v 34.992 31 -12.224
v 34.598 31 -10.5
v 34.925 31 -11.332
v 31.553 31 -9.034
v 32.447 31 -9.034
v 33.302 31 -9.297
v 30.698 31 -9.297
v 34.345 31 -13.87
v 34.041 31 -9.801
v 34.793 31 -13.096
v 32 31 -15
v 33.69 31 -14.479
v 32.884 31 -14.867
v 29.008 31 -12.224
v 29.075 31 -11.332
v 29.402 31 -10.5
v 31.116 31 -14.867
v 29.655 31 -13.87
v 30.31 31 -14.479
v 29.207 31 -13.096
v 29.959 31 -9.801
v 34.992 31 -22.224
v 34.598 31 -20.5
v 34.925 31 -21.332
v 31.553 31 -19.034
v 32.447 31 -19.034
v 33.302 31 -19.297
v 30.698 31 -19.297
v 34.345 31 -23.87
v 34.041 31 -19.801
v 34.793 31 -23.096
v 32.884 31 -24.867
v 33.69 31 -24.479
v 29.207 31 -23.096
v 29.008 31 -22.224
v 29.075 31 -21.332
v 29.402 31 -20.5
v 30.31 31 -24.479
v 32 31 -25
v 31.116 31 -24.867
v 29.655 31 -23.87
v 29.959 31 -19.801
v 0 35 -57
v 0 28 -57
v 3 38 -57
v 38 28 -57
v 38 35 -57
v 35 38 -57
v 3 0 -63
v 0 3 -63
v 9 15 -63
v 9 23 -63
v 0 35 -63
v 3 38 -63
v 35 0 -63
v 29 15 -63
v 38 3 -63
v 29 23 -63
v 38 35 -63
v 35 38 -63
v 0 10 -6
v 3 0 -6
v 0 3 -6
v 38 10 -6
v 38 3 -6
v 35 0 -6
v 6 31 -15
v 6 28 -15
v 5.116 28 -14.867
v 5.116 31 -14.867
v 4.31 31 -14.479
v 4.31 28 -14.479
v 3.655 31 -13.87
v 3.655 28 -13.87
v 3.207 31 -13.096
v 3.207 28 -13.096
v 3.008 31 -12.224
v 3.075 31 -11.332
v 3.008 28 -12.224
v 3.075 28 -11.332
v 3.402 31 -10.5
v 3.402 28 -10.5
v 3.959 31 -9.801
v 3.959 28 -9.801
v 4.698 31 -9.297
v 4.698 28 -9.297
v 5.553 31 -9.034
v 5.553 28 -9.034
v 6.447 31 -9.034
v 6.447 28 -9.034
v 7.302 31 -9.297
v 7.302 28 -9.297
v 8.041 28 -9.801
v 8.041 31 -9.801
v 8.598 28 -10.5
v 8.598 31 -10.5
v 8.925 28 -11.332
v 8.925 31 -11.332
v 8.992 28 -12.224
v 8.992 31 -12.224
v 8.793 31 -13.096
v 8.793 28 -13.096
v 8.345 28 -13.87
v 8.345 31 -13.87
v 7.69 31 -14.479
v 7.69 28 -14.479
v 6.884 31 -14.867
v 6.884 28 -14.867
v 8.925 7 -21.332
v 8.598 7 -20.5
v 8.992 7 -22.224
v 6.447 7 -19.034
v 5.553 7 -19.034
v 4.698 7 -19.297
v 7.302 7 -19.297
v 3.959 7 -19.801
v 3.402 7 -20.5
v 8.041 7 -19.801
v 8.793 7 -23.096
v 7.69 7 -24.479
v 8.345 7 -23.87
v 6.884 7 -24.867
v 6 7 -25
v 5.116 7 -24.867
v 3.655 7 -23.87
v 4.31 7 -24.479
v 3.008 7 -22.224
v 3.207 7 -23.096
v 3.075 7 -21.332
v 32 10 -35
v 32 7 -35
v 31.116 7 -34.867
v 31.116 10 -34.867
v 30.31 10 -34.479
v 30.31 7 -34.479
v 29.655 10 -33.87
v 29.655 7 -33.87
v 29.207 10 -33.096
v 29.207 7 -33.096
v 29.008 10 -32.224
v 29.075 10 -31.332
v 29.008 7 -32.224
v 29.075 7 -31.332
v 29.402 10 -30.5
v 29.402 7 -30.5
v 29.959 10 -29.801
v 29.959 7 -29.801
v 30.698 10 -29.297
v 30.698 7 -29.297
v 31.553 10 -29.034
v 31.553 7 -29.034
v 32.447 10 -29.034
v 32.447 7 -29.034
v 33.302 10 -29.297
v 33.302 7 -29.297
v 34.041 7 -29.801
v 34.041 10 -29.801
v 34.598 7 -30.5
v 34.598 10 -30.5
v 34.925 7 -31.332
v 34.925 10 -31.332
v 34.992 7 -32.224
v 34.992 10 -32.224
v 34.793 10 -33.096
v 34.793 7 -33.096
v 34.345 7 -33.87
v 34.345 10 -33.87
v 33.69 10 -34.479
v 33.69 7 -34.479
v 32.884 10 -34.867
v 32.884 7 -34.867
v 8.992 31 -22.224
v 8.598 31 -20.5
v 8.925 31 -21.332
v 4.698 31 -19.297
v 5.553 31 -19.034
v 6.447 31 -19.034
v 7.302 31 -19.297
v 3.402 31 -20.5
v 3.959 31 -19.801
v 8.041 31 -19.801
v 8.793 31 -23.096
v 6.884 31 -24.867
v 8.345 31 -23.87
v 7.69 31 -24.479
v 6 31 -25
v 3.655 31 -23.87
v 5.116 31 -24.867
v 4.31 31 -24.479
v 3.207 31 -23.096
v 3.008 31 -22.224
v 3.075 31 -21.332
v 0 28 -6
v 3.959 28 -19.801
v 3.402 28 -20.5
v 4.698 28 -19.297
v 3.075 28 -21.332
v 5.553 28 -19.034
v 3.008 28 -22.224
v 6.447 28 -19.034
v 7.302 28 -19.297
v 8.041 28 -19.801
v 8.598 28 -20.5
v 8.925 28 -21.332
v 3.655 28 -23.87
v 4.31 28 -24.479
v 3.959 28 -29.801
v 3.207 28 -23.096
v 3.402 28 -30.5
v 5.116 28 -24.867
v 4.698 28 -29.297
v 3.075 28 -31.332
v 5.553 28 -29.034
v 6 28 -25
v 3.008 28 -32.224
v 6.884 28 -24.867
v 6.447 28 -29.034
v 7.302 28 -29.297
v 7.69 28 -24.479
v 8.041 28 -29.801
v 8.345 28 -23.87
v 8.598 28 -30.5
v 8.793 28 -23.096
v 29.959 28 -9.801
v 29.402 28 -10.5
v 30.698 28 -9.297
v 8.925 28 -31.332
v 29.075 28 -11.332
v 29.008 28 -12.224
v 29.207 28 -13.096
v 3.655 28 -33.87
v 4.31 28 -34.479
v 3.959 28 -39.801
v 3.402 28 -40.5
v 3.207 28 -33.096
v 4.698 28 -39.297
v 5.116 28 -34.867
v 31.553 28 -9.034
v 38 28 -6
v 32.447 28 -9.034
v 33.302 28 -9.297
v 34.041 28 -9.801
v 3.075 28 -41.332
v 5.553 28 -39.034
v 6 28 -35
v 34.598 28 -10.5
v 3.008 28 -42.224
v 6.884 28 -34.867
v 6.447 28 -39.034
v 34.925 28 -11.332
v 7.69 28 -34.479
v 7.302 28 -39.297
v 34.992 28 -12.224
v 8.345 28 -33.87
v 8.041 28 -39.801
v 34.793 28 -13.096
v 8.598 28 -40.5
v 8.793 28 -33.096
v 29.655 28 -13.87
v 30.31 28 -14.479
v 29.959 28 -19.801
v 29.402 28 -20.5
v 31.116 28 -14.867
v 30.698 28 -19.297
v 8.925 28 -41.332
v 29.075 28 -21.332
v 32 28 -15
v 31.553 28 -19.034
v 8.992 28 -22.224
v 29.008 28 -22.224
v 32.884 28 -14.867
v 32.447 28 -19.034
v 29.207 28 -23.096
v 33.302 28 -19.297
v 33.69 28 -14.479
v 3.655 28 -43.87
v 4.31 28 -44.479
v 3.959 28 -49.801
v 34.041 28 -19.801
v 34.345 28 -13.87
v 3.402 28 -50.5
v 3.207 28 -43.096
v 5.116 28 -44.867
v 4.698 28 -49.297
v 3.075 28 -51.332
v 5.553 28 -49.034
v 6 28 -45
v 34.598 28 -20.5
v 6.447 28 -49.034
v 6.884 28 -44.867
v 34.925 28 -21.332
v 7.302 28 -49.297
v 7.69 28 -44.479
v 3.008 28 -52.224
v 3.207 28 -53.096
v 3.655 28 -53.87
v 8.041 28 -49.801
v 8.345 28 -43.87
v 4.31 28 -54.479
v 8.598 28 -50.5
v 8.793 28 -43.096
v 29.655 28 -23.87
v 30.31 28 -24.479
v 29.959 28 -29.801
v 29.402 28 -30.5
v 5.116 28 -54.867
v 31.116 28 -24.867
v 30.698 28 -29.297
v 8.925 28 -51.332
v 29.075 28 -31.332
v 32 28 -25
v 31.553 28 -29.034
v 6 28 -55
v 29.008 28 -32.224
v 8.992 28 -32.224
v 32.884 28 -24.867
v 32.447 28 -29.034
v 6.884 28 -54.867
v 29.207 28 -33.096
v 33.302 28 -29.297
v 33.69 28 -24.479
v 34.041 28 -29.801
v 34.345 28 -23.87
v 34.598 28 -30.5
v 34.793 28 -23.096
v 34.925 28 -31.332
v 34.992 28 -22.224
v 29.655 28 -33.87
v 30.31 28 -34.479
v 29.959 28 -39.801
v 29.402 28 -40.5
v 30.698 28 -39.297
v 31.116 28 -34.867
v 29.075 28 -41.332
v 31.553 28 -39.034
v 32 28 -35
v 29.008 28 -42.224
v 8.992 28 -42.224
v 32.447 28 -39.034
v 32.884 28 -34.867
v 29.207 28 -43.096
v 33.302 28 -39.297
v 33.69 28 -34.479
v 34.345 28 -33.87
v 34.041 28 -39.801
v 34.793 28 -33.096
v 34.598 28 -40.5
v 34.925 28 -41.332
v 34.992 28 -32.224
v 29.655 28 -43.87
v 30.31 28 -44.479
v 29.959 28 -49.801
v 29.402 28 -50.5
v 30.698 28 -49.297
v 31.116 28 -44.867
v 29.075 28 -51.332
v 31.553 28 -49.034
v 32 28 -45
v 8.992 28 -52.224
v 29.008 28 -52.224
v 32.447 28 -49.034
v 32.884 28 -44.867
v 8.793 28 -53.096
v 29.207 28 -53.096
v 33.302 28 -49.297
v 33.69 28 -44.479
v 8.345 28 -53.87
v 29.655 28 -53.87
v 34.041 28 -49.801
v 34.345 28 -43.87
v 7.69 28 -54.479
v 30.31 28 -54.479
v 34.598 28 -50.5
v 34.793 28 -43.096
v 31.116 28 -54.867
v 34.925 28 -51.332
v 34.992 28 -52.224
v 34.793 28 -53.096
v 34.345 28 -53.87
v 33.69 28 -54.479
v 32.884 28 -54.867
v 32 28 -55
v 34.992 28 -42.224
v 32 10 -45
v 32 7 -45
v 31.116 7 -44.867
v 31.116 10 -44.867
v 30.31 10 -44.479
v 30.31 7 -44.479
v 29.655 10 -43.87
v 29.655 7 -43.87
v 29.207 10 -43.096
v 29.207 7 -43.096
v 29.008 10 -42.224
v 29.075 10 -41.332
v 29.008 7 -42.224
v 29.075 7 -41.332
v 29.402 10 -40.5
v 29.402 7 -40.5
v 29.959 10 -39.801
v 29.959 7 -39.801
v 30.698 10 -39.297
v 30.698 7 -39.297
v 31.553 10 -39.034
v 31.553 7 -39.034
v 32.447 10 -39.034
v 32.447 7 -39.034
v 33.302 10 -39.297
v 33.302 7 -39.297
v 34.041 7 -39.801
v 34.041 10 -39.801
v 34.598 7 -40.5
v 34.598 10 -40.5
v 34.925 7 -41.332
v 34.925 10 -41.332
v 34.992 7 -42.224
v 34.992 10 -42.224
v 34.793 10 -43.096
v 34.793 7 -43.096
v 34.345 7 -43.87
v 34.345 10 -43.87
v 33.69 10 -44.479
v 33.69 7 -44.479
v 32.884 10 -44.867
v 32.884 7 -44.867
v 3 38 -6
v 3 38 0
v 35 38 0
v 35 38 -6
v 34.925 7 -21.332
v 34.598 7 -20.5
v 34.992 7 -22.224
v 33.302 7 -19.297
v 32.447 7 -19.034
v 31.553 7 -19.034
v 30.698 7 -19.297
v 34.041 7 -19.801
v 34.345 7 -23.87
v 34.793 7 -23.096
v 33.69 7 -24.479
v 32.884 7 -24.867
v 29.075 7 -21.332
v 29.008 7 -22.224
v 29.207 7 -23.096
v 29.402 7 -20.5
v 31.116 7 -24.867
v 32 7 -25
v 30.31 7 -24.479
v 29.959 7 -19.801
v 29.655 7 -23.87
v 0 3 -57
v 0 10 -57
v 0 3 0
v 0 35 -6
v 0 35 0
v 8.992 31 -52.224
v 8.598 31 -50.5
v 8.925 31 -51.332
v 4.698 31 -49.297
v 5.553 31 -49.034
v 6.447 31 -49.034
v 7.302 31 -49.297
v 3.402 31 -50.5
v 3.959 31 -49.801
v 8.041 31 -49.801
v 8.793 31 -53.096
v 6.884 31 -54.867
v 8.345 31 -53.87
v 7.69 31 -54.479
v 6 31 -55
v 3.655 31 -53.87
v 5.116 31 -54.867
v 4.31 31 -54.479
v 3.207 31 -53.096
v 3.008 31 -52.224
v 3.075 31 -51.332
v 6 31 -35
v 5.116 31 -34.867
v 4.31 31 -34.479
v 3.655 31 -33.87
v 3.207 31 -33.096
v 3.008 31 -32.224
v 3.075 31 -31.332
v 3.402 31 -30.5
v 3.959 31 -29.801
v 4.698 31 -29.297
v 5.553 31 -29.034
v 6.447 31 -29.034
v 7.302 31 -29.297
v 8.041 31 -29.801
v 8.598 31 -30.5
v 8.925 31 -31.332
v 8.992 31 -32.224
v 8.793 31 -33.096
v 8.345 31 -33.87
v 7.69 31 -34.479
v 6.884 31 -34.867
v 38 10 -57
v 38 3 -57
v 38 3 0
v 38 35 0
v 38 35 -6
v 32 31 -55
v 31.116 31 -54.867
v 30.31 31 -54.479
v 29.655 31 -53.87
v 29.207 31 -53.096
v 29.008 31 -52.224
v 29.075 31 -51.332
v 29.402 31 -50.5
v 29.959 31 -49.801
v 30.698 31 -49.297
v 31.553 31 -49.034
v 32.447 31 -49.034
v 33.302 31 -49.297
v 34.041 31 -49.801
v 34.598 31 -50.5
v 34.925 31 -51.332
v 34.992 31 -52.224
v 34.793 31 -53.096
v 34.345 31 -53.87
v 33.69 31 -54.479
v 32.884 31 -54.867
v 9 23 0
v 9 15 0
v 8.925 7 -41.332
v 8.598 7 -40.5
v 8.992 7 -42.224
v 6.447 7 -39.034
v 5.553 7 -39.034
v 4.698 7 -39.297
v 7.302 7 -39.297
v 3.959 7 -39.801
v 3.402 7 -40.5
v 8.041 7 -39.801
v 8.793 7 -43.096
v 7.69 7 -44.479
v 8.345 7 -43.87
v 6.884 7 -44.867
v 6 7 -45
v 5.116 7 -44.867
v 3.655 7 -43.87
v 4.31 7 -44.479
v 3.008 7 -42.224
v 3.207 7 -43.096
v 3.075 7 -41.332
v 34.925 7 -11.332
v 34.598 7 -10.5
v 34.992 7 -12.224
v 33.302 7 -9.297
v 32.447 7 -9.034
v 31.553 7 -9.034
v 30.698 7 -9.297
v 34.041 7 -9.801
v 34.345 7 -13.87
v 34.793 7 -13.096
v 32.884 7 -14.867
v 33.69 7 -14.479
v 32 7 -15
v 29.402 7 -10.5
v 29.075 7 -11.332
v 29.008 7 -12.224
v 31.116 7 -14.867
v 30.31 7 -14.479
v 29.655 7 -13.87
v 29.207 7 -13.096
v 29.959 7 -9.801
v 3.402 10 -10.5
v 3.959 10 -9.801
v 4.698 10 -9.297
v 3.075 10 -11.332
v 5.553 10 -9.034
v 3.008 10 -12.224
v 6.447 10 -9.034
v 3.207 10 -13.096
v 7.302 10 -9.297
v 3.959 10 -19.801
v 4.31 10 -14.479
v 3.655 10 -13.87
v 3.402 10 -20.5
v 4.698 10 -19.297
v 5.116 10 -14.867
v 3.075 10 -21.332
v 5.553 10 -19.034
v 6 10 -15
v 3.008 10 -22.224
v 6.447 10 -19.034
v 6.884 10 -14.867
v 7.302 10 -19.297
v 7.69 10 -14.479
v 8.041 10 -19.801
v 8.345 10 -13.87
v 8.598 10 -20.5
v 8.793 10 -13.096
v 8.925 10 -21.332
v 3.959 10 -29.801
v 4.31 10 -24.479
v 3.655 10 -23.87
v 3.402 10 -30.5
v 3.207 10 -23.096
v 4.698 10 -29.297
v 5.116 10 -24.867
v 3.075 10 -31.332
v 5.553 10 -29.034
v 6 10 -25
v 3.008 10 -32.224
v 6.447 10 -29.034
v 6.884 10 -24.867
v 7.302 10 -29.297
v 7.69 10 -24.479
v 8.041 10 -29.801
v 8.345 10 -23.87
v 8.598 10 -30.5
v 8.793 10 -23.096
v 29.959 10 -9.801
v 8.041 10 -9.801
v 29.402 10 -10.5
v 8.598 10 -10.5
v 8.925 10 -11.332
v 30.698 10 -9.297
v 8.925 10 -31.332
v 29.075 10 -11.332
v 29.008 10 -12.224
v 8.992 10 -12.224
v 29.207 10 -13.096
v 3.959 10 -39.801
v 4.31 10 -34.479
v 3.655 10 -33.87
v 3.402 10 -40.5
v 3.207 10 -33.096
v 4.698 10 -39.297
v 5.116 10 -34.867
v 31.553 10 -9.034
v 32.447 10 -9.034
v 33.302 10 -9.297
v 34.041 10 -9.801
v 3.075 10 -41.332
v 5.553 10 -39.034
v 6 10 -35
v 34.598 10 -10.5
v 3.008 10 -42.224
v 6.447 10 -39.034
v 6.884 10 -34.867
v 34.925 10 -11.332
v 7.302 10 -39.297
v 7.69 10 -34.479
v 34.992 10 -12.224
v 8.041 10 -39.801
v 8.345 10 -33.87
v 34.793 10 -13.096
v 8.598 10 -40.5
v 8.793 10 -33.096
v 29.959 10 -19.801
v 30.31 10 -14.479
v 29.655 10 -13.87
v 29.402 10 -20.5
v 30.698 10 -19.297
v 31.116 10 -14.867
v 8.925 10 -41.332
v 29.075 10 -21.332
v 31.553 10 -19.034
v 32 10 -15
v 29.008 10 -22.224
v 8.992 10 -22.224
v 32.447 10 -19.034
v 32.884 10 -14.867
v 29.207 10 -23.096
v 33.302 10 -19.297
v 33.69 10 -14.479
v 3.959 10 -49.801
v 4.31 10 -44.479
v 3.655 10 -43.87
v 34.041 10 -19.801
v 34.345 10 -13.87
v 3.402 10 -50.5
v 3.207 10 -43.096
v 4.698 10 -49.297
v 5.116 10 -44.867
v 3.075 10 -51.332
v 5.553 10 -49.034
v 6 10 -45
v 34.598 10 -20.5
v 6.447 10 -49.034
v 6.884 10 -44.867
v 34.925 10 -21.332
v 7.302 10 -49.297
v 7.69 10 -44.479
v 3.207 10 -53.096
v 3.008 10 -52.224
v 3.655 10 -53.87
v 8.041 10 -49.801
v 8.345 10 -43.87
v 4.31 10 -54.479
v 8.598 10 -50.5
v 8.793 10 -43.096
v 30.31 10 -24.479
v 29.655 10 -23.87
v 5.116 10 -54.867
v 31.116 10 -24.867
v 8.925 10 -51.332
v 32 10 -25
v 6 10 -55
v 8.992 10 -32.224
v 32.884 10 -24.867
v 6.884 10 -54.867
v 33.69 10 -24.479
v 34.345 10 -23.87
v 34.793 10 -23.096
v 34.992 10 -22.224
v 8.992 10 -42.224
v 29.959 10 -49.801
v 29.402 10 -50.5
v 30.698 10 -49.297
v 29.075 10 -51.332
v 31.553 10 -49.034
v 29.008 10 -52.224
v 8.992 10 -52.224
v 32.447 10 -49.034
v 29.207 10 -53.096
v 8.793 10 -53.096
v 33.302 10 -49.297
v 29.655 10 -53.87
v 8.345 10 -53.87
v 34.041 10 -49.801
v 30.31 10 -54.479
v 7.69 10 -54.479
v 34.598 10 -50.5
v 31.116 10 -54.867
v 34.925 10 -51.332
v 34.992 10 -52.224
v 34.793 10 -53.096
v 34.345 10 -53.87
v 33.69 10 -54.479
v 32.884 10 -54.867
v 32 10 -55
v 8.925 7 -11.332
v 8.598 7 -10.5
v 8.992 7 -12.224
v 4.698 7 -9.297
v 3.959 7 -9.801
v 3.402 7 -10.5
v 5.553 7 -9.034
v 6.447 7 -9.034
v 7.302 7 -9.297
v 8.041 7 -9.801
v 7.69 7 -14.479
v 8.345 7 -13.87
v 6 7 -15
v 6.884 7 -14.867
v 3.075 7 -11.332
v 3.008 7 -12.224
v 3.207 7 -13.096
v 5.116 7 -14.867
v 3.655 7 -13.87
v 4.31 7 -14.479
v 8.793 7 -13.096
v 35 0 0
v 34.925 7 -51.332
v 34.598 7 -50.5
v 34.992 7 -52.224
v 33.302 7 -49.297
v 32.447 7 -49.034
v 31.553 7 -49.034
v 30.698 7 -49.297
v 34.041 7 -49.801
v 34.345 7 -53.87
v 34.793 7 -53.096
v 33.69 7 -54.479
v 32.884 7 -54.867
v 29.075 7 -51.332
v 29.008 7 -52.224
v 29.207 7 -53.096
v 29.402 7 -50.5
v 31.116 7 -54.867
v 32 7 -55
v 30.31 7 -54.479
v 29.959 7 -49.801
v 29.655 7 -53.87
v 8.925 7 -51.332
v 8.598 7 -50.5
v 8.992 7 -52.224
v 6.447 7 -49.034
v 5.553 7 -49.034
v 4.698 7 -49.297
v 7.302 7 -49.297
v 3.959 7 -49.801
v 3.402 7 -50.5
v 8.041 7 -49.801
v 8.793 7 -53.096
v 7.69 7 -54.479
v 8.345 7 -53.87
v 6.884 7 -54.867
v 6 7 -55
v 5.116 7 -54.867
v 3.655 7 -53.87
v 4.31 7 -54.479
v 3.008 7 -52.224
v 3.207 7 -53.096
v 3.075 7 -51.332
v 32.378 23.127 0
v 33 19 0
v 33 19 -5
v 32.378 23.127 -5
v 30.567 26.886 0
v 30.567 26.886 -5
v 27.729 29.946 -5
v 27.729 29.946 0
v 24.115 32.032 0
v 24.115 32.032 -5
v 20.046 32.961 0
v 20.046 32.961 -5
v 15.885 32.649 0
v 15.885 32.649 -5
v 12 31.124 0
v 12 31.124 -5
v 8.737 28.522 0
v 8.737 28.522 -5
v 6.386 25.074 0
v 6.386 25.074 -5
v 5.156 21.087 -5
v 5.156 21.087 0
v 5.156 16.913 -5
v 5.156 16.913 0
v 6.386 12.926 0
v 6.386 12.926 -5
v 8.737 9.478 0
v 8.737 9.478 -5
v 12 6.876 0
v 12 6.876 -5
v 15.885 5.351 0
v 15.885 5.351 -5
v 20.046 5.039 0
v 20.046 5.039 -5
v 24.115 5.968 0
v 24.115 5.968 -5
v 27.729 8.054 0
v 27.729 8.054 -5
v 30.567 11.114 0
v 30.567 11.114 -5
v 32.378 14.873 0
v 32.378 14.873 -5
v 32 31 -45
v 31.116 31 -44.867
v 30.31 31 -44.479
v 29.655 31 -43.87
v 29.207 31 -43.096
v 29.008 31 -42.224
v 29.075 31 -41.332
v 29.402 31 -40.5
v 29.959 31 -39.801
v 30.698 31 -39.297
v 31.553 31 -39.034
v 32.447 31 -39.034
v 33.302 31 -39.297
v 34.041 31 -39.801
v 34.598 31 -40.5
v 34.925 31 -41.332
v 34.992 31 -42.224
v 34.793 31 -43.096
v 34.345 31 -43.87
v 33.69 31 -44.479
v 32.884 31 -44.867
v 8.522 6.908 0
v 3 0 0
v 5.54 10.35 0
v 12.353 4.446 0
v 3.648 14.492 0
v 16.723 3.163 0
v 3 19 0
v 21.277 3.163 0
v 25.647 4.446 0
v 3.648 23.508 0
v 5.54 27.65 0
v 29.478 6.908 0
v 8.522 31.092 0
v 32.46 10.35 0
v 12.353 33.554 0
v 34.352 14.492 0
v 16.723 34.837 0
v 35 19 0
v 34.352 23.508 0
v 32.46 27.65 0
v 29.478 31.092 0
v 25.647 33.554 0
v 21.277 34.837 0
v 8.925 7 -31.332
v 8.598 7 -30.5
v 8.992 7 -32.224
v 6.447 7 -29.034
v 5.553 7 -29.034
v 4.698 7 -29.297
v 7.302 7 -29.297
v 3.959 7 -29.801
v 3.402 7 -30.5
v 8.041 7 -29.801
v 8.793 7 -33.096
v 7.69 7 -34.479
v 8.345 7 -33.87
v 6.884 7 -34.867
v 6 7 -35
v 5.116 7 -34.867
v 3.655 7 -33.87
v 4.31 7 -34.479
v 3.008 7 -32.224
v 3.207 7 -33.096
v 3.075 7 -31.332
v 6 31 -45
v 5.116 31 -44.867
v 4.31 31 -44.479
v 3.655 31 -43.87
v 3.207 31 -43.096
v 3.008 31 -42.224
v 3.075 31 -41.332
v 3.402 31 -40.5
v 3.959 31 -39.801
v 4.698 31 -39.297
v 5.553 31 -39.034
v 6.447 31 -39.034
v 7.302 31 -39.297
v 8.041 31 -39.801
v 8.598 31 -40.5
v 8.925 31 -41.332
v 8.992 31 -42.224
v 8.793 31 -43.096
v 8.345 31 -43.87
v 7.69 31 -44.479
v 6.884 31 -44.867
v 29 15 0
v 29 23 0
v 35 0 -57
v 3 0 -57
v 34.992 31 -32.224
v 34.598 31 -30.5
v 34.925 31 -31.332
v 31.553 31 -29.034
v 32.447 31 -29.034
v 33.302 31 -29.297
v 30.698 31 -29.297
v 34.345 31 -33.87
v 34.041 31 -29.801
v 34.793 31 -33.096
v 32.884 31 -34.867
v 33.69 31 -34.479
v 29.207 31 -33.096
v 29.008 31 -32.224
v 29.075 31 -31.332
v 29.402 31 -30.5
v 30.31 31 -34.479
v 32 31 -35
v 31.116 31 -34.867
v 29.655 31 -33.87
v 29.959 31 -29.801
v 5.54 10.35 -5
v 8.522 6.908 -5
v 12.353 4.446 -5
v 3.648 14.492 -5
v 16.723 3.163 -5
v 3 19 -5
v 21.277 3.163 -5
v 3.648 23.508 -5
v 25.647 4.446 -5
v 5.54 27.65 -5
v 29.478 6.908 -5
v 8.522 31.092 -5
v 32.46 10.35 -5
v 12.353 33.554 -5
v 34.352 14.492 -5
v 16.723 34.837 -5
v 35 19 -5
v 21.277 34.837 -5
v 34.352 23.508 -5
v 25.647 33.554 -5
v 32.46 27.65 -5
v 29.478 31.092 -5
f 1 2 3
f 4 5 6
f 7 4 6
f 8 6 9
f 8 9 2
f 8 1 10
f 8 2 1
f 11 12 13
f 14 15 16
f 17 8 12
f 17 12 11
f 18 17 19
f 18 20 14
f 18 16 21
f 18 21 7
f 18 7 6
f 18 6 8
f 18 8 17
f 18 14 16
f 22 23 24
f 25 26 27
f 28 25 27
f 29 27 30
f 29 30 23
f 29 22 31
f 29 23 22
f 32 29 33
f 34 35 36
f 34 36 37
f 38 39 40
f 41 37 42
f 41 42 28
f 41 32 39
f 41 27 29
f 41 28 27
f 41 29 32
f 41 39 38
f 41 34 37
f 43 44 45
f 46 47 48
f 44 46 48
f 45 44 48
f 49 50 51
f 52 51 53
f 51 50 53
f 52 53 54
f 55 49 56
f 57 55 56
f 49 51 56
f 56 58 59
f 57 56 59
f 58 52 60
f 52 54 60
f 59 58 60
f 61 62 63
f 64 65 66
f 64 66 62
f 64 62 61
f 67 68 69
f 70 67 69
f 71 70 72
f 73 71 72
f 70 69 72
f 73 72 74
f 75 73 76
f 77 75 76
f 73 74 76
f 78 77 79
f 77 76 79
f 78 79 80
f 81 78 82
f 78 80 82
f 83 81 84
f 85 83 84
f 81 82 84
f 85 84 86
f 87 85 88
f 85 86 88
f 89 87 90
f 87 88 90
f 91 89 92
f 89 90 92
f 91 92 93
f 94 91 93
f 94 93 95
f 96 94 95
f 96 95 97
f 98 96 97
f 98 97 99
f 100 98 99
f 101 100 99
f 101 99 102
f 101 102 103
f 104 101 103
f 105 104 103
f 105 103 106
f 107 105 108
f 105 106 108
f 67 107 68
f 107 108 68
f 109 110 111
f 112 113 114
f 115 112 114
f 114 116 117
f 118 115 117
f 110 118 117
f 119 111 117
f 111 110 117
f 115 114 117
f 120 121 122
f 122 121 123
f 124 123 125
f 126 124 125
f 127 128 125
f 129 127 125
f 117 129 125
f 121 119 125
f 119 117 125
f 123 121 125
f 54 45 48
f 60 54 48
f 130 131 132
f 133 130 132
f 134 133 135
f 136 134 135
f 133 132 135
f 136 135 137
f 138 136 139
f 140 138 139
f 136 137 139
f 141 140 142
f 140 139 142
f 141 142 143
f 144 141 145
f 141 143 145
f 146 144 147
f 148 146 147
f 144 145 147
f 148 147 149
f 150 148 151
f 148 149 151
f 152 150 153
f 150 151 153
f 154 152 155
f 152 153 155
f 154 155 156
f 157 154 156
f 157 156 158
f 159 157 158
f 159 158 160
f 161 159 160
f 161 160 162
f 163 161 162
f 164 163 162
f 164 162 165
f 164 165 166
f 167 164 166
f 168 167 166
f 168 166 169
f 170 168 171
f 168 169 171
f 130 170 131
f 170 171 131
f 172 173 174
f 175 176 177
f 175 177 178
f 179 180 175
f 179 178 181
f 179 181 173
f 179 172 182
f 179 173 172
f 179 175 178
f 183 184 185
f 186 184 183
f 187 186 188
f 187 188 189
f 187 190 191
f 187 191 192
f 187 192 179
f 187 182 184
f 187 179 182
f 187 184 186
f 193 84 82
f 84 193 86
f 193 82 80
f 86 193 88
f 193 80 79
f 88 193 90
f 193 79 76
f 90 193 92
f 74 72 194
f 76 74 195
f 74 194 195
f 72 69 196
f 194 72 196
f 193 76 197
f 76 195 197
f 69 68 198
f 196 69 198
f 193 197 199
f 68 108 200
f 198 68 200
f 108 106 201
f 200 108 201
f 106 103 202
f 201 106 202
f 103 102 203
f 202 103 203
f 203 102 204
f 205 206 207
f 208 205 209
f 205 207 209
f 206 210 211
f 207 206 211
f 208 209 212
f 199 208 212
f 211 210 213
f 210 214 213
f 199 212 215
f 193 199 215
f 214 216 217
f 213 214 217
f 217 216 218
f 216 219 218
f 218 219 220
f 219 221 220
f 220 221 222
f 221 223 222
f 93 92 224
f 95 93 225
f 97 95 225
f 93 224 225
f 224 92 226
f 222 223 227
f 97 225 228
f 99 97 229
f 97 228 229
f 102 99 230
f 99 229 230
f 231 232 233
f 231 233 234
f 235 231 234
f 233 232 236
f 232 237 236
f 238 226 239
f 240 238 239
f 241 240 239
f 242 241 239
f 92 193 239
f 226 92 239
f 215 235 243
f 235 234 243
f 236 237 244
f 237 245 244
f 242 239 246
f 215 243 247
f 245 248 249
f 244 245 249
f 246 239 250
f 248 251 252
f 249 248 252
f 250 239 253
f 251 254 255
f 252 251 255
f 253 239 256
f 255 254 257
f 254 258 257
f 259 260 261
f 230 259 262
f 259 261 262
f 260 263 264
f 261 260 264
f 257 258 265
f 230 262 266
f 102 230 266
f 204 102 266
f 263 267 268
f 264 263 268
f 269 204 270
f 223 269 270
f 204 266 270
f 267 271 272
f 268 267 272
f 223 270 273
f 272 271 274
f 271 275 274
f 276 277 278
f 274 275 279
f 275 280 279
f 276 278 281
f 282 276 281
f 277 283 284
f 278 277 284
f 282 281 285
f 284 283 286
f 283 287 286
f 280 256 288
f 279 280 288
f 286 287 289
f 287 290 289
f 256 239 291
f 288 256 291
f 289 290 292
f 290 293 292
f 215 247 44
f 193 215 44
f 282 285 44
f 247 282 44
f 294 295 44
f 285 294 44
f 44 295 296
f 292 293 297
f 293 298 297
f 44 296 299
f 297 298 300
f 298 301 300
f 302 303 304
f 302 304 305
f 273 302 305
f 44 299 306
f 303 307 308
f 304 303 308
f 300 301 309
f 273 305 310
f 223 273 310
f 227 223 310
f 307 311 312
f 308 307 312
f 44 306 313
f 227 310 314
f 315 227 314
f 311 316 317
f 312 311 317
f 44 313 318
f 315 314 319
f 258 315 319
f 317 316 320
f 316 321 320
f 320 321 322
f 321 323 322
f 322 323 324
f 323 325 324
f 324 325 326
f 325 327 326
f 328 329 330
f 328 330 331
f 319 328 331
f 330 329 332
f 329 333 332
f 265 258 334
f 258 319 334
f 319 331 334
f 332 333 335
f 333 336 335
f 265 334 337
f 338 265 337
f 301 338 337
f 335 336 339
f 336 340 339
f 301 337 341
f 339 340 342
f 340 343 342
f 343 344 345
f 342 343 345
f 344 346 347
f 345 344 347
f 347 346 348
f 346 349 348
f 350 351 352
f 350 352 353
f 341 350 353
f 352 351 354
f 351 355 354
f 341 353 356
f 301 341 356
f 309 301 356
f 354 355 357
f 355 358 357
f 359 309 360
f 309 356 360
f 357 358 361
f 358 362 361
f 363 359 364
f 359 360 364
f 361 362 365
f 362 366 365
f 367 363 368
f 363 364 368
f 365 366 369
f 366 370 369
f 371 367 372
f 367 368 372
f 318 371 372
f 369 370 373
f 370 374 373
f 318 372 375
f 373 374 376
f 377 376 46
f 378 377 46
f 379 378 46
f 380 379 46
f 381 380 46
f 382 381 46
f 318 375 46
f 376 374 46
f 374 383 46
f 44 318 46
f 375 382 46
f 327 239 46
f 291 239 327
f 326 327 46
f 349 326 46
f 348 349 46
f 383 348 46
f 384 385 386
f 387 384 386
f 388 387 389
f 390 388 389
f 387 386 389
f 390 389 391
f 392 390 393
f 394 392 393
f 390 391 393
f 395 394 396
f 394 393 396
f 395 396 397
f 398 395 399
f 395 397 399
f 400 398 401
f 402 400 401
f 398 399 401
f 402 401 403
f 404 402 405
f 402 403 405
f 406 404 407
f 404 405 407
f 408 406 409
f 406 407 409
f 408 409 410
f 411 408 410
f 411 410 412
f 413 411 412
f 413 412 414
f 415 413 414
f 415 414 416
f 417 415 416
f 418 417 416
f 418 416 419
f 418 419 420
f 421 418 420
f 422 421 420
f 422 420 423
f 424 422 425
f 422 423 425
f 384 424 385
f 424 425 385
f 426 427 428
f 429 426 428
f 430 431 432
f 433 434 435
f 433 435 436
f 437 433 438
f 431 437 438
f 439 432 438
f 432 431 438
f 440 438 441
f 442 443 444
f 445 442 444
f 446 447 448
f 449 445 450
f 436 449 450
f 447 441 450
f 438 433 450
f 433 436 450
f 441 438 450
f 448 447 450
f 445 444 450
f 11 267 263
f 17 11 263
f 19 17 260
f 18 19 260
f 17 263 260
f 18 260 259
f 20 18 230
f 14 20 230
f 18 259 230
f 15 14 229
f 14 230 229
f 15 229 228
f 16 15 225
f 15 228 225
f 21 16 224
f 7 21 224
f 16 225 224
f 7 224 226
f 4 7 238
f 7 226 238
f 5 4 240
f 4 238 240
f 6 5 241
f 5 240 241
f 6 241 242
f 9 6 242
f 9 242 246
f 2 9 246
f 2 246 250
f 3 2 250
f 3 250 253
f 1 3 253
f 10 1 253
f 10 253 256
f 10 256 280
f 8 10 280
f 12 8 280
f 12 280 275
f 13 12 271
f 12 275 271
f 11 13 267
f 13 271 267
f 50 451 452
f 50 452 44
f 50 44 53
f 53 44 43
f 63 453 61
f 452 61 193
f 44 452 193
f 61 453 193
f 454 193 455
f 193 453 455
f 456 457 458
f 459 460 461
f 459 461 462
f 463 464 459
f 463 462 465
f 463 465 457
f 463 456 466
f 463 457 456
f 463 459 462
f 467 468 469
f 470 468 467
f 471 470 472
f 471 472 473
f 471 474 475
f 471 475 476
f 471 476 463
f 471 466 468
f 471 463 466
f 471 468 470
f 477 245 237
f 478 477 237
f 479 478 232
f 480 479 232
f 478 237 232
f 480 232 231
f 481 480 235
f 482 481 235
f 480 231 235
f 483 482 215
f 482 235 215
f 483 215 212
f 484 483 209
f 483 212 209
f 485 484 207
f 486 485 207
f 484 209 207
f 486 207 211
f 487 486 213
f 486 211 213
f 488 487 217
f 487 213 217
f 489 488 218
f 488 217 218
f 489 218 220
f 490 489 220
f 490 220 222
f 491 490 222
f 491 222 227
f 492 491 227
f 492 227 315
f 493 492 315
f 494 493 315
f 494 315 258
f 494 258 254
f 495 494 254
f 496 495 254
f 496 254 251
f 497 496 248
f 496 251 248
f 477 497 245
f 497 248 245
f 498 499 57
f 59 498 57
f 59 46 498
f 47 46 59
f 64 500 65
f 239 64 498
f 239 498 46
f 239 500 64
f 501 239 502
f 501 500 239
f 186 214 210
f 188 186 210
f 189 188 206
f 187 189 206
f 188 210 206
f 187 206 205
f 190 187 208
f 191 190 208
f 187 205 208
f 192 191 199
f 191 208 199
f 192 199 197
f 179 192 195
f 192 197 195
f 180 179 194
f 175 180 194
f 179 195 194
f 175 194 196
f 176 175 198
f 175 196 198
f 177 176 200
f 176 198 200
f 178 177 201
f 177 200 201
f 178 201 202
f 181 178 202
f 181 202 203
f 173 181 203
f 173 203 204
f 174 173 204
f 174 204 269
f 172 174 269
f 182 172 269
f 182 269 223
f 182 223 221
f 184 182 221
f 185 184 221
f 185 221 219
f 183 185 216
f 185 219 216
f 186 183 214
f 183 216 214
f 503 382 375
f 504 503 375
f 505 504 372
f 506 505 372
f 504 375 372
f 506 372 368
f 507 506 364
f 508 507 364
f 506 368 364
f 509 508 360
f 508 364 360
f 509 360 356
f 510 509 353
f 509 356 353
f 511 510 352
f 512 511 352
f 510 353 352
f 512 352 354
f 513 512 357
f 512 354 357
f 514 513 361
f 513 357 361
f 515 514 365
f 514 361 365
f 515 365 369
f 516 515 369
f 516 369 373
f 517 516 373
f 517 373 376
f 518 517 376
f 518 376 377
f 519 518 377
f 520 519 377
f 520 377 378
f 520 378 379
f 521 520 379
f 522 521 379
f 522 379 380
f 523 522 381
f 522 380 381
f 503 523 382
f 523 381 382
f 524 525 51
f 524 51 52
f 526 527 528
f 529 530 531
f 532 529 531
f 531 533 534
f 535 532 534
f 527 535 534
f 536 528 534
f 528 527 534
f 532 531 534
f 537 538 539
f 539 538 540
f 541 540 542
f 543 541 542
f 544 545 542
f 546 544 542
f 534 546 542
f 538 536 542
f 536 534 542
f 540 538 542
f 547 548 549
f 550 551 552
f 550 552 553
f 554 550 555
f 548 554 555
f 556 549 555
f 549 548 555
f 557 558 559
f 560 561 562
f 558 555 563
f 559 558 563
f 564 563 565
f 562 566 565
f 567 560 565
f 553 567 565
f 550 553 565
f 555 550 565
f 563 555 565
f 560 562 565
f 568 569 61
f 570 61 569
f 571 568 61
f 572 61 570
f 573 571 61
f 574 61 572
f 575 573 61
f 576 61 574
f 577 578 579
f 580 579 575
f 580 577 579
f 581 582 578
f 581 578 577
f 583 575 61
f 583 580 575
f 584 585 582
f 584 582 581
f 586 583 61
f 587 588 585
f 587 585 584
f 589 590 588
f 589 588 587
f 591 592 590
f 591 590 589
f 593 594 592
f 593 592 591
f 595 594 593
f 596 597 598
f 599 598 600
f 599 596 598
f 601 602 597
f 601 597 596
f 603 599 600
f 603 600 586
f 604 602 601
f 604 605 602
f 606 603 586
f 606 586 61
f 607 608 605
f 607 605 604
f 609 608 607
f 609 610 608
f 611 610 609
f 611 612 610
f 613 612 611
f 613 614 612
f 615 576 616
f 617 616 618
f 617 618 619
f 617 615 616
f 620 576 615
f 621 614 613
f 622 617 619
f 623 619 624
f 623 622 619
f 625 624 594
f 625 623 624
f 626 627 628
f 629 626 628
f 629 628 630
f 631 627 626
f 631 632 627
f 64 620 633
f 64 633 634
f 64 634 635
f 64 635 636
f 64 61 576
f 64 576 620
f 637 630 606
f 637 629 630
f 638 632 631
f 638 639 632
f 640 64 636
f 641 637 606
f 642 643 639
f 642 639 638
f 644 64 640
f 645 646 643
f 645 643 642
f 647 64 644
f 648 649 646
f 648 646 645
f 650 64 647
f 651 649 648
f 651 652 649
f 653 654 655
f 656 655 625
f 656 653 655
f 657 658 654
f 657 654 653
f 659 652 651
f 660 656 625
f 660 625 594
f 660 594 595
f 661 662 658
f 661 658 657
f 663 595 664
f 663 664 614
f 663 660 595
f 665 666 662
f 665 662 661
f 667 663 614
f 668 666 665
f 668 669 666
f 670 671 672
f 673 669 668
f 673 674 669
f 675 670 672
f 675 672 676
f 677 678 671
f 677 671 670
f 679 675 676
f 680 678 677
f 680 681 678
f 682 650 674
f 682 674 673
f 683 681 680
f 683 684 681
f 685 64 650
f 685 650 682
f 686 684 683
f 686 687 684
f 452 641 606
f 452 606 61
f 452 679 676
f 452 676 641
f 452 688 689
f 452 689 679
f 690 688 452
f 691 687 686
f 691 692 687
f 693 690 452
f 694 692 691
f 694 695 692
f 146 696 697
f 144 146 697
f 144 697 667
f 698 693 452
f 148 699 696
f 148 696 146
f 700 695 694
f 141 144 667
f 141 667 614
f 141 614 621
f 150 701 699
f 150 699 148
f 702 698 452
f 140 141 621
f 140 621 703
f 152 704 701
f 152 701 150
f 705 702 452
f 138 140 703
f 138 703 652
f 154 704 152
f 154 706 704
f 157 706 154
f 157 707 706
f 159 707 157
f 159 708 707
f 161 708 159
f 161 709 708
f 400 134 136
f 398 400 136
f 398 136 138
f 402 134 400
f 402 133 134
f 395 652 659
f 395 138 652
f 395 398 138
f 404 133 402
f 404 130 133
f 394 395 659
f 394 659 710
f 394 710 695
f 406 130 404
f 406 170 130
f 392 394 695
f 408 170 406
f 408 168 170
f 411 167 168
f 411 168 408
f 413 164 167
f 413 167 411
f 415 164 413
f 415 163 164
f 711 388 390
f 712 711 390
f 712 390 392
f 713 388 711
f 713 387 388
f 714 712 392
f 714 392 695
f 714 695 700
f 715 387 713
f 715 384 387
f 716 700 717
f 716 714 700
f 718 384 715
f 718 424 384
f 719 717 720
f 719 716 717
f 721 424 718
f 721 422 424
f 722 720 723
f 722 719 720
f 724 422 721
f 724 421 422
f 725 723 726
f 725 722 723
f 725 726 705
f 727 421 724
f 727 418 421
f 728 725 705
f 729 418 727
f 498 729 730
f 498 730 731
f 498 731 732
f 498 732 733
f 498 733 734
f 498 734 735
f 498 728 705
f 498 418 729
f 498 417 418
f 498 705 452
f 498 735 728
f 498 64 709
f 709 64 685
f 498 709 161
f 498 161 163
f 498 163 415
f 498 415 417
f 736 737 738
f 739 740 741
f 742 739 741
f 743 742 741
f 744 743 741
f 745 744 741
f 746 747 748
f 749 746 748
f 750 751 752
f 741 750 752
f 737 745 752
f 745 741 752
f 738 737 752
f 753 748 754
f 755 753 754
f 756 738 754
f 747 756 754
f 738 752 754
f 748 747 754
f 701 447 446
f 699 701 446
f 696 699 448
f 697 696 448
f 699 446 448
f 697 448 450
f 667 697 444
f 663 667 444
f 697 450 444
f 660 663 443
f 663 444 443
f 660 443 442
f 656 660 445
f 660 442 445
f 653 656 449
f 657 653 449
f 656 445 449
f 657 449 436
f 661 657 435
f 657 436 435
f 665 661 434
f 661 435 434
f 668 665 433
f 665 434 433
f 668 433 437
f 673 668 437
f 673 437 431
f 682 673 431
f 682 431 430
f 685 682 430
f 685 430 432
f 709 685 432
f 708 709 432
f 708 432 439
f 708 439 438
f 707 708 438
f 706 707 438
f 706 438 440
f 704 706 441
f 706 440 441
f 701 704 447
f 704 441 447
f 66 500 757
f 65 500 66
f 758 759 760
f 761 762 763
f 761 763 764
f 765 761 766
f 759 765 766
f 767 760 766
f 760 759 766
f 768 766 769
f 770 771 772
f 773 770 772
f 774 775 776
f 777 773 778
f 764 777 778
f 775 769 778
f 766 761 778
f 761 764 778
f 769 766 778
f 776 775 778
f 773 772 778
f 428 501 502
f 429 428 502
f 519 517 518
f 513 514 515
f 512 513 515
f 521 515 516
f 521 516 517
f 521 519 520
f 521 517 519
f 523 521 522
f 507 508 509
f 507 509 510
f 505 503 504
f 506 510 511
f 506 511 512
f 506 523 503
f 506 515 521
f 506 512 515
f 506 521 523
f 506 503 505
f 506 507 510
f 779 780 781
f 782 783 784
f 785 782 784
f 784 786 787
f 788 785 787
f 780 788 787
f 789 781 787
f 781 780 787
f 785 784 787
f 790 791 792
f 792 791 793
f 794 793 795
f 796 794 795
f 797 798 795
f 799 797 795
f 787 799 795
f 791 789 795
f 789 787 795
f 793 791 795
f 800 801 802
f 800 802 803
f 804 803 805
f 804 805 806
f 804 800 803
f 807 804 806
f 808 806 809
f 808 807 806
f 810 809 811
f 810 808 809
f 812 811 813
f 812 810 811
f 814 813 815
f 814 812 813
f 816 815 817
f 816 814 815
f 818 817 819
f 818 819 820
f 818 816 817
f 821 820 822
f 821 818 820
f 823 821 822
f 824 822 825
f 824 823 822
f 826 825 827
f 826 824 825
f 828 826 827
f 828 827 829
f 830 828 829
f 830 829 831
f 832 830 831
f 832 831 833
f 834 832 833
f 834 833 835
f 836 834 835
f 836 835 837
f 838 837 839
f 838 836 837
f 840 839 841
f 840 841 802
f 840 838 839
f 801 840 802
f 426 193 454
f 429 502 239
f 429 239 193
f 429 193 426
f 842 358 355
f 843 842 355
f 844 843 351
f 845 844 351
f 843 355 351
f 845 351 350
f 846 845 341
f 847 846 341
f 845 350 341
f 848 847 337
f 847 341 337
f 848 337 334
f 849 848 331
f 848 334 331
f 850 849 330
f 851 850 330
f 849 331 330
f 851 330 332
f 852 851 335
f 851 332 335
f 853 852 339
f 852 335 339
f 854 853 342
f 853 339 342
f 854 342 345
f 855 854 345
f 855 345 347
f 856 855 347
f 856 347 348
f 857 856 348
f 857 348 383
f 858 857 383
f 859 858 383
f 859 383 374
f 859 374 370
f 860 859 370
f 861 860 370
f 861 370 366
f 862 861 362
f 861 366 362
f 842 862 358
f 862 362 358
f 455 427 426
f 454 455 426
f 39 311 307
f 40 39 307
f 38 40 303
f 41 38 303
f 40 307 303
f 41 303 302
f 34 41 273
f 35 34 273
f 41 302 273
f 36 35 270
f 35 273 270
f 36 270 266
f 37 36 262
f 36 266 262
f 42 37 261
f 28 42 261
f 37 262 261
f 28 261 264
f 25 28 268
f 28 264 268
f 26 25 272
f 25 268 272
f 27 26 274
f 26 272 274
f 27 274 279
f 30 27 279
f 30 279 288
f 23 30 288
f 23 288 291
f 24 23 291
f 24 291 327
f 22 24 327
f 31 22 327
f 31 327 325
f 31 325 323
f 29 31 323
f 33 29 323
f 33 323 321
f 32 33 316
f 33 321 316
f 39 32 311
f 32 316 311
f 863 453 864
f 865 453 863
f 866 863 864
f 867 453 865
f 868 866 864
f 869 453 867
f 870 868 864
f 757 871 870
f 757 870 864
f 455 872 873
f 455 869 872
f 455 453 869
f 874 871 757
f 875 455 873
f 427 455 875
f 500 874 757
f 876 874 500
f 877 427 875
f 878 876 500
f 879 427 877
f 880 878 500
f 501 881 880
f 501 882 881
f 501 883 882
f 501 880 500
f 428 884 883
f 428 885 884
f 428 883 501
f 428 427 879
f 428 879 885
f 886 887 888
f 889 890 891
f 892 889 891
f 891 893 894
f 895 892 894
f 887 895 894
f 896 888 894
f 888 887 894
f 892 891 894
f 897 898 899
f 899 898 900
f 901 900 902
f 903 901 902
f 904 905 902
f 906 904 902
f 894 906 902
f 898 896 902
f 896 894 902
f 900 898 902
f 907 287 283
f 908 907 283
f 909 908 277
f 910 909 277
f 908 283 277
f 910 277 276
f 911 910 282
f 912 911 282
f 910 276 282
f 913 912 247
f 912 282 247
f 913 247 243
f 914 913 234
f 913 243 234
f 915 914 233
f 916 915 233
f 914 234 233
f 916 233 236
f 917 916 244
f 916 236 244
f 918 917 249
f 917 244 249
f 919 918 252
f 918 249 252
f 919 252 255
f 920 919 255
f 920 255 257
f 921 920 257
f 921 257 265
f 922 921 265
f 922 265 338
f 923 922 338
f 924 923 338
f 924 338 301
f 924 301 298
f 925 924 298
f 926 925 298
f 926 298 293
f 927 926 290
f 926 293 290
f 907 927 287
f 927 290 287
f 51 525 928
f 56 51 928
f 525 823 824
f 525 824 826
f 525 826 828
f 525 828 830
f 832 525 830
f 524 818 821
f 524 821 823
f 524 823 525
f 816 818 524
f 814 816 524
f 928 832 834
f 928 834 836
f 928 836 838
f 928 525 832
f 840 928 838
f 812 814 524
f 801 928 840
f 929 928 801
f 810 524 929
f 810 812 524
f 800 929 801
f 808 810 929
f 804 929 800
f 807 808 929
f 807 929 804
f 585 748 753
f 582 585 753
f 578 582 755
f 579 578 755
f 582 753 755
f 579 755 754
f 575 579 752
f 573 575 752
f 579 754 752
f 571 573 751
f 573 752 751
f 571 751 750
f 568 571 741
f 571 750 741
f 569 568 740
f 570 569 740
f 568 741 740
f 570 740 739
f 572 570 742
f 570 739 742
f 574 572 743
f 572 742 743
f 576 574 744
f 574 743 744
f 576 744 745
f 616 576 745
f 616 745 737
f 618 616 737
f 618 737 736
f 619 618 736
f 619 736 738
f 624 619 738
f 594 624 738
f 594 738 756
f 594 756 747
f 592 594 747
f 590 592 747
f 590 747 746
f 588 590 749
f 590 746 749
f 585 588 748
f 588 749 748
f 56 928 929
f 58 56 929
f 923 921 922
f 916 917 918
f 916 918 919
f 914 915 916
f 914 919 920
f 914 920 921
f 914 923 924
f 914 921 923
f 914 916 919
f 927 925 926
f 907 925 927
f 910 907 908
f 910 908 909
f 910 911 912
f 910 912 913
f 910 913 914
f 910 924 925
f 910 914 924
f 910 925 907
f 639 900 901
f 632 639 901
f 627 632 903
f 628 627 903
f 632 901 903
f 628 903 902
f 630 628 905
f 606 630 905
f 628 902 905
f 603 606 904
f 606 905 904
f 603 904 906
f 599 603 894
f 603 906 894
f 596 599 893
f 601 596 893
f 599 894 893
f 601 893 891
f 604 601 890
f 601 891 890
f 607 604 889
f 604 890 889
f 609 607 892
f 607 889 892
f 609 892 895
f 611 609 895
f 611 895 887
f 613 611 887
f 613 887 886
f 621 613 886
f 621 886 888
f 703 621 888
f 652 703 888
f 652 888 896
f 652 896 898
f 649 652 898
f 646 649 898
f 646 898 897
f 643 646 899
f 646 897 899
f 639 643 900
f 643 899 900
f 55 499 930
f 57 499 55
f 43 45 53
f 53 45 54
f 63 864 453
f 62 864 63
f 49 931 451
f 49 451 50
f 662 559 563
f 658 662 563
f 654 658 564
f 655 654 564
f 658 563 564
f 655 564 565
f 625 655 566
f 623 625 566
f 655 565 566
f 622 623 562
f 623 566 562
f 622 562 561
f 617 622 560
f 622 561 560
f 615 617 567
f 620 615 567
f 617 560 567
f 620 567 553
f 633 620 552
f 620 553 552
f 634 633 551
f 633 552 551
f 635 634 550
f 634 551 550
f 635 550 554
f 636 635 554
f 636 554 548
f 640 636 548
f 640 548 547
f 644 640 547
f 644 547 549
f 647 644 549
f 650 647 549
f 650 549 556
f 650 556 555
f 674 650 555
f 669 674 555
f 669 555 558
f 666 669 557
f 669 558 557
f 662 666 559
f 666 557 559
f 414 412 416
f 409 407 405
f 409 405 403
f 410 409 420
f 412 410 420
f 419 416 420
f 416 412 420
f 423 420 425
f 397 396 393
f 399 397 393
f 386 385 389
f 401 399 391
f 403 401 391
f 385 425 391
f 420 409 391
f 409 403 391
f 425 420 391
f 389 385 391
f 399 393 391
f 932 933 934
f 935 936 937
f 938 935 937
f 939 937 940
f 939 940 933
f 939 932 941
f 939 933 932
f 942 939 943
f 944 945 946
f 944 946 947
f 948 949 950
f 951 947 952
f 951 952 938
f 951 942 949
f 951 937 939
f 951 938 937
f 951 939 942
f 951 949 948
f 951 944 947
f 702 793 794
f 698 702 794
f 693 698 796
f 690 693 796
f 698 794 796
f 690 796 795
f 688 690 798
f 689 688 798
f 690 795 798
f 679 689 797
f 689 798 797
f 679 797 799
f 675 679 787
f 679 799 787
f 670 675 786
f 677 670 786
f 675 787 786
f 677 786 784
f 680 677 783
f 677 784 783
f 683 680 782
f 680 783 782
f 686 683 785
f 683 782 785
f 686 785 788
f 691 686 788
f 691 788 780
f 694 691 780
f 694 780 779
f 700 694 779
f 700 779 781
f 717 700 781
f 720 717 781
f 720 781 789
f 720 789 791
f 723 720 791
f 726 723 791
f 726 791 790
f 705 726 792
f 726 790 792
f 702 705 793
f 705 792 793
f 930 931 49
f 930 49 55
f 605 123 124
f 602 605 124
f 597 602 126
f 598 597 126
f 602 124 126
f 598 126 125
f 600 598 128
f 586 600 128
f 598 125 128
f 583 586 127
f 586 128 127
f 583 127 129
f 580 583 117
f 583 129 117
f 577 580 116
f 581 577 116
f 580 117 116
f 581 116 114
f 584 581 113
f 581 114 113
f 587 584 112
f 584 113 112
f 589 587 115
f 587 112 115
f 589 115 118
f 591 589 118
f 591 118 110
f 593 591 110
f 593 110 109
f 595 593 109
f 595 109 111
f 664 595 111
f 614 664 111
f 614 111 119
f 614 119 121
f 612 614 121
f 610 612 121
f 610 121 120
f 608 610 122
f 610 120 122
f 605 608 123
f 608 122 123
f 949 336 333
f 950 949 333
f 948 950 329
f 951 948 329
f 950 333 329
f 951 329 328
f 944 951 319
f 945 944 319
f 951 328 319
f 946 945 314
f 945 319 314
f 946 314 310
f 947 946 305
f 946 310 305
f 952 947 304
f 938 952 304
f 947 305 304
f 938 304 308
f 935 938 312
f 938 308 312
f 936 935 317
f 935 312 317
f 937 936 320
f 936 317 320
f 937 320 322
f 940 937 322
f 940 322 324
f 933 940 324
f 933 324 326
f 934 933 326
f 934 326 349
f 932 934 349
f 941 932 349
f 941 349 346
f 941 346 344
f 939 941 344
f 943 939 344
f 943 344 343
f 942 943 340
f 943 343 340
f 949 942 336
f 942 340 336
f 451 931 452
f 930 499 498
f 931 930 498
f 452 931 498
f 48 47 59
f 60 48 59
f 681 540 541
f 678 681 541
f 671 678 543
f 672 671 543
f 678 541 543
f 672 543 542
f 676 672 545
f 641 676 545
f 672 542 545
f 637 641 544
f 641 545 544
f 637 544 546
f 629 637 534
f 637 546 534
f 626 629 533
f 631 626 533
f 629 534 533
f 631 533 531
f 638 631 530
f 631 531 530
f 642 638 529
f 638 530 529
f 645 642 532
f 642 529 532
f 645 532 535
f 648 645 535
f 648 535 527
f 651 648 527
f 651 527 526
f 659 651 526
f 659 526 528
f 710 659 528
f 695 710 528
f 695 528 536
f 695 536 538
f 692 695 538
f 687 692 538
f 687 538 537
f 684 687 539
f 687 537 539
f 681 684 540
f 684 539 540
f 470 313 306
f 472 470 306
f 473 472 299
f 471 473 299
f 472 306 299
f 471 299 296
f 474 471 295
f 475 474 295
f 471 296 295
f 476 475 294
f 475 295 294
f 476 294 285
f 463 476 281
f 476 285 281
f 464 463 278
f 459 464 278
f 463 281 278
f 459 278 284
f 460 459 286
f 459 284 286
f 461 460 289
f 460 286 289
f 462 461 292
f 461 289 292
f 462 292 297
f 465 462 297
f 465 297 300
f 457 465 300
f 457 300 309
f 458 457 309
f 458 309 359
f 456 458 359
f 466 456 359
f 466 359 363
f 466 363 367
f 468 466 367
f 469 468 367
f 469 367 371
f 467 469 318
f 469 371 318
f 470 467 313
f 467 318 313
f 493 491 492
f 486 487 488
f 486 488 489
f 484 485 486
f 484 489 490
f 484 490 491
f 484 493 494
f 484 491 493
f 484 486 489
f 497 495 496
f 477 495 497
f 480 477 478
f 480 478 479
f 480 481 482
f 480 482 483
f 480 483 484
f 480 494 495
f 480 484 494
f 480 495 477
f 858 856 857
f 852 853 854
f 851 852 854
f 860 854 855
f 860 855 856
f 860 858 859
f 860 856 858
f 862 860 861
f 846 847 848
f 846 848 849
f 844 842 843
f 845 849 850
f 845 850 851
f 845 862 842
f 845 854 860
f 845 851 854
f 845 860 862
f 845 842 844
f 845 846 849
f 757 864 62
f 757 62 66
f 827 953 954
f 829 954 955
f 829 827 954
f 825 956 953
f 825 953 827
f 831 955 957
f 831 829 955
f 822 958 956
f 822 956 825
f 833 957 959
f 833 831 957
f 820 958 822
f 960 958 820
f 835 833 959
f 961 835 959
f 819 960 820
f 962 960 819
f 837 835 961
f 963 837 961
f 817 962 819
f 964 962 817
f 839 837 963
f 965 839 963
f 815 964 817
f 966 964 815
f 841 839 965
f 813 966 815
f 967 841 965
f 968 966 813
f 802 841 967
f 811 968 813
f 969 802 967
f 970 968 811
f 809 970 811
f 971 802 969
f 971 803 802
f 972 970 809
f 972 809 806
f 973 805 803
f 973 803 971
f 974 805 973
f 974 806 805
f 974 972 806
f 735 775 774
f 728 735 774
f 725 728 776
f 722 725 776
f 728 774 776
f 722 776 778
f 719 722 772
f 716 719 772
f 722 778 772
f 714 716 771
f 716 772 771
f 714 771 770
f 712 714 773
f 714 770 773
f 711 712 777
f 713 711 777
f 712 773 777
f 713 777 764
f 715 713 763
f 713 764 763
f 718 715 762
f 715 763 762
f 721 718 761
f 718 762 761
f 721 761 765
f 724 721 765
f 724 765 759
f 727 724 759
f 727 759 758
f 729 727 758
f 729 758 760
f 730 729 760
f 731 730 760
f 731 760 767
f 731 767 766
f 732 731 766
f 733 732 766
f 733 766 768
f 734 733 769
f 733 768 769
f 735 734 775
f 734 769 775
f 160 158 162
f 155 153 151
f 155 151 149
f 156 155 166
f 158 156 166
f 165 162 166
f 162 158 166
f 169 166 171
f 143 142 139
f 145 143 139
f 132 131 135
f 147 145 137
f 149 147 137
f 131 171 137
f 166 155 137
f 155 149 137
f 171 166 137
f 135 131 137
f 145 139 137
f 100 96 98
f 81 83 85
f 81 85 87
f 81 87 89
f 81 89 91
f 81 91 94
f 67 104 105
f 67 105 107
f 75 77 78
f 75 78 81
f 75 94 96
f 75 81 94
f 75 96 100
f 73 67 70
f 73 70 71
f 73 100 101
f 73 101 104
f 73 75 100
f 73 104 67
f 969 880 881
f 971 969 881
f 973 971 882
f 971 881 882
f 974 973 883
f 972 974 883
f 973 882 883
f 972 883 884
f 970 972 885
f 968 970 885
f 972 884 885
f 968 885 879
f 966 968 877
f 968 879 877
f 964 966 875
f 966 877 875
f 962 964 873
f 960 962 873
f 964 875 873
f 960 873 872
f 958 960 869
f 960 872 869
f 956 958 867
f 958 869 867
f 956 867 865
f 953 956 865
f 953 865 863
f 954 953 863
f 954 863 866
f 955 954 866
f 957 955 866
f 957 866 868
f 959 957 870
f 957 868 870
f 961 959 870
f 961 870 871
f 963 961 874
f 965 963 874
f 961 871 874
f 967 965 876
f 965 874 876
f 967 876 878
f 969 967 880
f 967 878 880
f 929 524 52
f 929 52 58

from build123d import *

# Parameters (mm, degrees)
SKETCH2_W           = 38
SKETCH2_H           = 38
BOSS_EXTRUDE1_DEPTH = 63
SKETCH3_W           = 51
SKETCH3_H           = 10
CUT_EXTRUDE1_DEPTH  = 83.807004535
SKETCH4_W           = 20
SKETCH4_H           = 8
CUT_EXTRUDE2_DEPTH  = 83.807004535
SKETCH5_R           = 16
SKETCH5_R_2         = 14
CUT_EXTRUDE3_DEPTH  = 5
SKETCH6_R           = 3
BOSS_EXTRUDE2_DEPTH = 3
BOSS_EXTRUDE3_START = -21
SKETCH6_2_R         = 3
BOSS_EXTRUDE3_DEPTH = 3
CHAMFER1_SIZE       = 3


with BuildPart() as part:
    # Sketch2 → Boss-Extrude1 (new body)
    with BuildSketch(Plane.XY):
        with Locations((19, 19)):
            Rectangle(SKETCH2_W, SKETCH2_H)
    extrude(amount=-BOSS_EXTRUDE1_DEPTH)

    # Sketch3 → Cut-Extrude1 (cut, through all)
    with BuildSketch(Plane(origin=(38, 0, 0), x_dir=(0, 0, -1), z_dir=(1, 0, 0))):
        with Locations((31.5, 33)):
            Rectangle(SKETCH3_W, SKETCH3_H)
        with Locations((31.5, 5)):
            Rectangle(SKETCH3_W, SKETCH3_H)
    extrude(amount=-CUT_EXTRUDE1_DEPTH, mode=Mode.SUBTRACT)

    # Sketch4 → Cut-Extrude2 (cut, through all)
    with BuildSketch(Plane.XY):
        with Locations((19, 19)):
            Rectangle(SKETCH4_W, SKETCH4_H)
    extrude(amount=-CUT_EXTRUDE2_DEPTH, mode=Mode.SUBTRACT)

    # Sketch5 → Cut-Extrude3 (cut)
    with BuildSketch(Plane.XY):
        with Locations((19, 19)):
            Circle(SKETCH5_R)
        with Locations((19, 19)):
            Circle(SKETCH5_R_2, mode=Mode.SUBTRACT)
    extrude(amount=-CUT_EXTRUDE3_DEPTH, mode=Mode.SUBTRACT)

    # Sketch6 → Boss-Extrude2 (add)
    with BuildSketch(Plane(origin=(0, 28, 0), x_dir=(1, 0, 0), z_dir=(0, 1, 0))):
        with Locations(Location((32, 12, 0), (0, 0, 90))):
            Circle(SKETCH6_R)
        with Locations(Location((32, 22, 0), (0, 0, 90))):
            Circle(SKETCH6_R)
        with Locations(Location((32, 32, 0), (0, 0, 90))):
            Circle(SKETCH6_R)
        with Locations(Location((32, 42, 0), (0, 0, 90))):
            Circle(SKETCH6_R)
        with Locations(Location((32, 52, 0), (0, 0, 90))):
            Circle(SKETCH6_R)
        with Locations(Location((6, 12, 0), (0, 0, 90))):
            Circle(SKETCH6_R)
        with Locations(Location((6, 22, 0), (0, 0, 90))):
            Circle(SKETCH6_R)
        with Locations(Location((6, 32, 0), (0, 0, 90))):
            Circle(SKETCH6_R)
        with Locations(Location((6, 42, 0), (0, 0, 90))):
            Circle(SKETCH6_R)
        with Locations(Location((6, 52, 0), (0, 0, 90))):
            Circle(SKETCH6_R)
    extrude(amount=BOSS_EXTRUDE2_DEPTH)

    # Sketch6<2> → Boss-Extrude3 (add)
    with BuildSketch(Plane(origin=(0, 28, 0), x_dir=(1, 0, 0), z_dir=(0, 1, 0)).offset(BOSS_EXTRUDE3_START)):
        with Locations(Location((32, 12, 0), (0, 0, 90))):
            Circle(SKETCH6_2_R)
        with Locations(Location((32, 22, 0), (0, 0, 90))):
            Circle(SKETCH6_2_R)
        with Locations(Location((32, 32, 0), (0, 0, 90))):
            Circle(SKETCH6_2_R)
        with Locations(Location((32, 42, 0), (0, 0, 90))):
            Circle(SKETCH6_2_R)
        with Locations(Location((32, 52, 0), (0, 0, 90))):
            Circle(SKETCH6_2_R)
        with Locations(Location((6, 12, 0), (0, 0, 90))):
            Circle(SKETCH6_2_R)
        with Locations(Location((6, 22, 0), (0, 0, 90))):
            Circle(SKETCH6_2_R)
        with Locations(Location((6, 32, 0), (0, 0, 90))):
            Circle(SKETCH6_2_R)
        with Locations(Location((6, 42, 0), (0, 0, 90))):
            Circle(SKETCH6_2_R)
        with Locations(Location((6, 52, 0), (0, 0, 90))):
            Circle(SKETCH6_2_R)
    extrude(amount=BOSS_EXTRUDE3_DEPTH)

    # Chamfer1
    chamfer1_edges = [part.edges().sort_by_distance(p)[0] for p in [
        (0, 0, -3),
        (38, 0, -3),
        (38, 38, -3),
        (0, 38, -3),
        (0, 38, -60),
        (38, 38, -60),
        (38, 0, -60),
        (0, 0, -60),
    ]]
    chamfer(chamfer1_edges, length=CHAMFER1_SIZE)


solid = part.part
